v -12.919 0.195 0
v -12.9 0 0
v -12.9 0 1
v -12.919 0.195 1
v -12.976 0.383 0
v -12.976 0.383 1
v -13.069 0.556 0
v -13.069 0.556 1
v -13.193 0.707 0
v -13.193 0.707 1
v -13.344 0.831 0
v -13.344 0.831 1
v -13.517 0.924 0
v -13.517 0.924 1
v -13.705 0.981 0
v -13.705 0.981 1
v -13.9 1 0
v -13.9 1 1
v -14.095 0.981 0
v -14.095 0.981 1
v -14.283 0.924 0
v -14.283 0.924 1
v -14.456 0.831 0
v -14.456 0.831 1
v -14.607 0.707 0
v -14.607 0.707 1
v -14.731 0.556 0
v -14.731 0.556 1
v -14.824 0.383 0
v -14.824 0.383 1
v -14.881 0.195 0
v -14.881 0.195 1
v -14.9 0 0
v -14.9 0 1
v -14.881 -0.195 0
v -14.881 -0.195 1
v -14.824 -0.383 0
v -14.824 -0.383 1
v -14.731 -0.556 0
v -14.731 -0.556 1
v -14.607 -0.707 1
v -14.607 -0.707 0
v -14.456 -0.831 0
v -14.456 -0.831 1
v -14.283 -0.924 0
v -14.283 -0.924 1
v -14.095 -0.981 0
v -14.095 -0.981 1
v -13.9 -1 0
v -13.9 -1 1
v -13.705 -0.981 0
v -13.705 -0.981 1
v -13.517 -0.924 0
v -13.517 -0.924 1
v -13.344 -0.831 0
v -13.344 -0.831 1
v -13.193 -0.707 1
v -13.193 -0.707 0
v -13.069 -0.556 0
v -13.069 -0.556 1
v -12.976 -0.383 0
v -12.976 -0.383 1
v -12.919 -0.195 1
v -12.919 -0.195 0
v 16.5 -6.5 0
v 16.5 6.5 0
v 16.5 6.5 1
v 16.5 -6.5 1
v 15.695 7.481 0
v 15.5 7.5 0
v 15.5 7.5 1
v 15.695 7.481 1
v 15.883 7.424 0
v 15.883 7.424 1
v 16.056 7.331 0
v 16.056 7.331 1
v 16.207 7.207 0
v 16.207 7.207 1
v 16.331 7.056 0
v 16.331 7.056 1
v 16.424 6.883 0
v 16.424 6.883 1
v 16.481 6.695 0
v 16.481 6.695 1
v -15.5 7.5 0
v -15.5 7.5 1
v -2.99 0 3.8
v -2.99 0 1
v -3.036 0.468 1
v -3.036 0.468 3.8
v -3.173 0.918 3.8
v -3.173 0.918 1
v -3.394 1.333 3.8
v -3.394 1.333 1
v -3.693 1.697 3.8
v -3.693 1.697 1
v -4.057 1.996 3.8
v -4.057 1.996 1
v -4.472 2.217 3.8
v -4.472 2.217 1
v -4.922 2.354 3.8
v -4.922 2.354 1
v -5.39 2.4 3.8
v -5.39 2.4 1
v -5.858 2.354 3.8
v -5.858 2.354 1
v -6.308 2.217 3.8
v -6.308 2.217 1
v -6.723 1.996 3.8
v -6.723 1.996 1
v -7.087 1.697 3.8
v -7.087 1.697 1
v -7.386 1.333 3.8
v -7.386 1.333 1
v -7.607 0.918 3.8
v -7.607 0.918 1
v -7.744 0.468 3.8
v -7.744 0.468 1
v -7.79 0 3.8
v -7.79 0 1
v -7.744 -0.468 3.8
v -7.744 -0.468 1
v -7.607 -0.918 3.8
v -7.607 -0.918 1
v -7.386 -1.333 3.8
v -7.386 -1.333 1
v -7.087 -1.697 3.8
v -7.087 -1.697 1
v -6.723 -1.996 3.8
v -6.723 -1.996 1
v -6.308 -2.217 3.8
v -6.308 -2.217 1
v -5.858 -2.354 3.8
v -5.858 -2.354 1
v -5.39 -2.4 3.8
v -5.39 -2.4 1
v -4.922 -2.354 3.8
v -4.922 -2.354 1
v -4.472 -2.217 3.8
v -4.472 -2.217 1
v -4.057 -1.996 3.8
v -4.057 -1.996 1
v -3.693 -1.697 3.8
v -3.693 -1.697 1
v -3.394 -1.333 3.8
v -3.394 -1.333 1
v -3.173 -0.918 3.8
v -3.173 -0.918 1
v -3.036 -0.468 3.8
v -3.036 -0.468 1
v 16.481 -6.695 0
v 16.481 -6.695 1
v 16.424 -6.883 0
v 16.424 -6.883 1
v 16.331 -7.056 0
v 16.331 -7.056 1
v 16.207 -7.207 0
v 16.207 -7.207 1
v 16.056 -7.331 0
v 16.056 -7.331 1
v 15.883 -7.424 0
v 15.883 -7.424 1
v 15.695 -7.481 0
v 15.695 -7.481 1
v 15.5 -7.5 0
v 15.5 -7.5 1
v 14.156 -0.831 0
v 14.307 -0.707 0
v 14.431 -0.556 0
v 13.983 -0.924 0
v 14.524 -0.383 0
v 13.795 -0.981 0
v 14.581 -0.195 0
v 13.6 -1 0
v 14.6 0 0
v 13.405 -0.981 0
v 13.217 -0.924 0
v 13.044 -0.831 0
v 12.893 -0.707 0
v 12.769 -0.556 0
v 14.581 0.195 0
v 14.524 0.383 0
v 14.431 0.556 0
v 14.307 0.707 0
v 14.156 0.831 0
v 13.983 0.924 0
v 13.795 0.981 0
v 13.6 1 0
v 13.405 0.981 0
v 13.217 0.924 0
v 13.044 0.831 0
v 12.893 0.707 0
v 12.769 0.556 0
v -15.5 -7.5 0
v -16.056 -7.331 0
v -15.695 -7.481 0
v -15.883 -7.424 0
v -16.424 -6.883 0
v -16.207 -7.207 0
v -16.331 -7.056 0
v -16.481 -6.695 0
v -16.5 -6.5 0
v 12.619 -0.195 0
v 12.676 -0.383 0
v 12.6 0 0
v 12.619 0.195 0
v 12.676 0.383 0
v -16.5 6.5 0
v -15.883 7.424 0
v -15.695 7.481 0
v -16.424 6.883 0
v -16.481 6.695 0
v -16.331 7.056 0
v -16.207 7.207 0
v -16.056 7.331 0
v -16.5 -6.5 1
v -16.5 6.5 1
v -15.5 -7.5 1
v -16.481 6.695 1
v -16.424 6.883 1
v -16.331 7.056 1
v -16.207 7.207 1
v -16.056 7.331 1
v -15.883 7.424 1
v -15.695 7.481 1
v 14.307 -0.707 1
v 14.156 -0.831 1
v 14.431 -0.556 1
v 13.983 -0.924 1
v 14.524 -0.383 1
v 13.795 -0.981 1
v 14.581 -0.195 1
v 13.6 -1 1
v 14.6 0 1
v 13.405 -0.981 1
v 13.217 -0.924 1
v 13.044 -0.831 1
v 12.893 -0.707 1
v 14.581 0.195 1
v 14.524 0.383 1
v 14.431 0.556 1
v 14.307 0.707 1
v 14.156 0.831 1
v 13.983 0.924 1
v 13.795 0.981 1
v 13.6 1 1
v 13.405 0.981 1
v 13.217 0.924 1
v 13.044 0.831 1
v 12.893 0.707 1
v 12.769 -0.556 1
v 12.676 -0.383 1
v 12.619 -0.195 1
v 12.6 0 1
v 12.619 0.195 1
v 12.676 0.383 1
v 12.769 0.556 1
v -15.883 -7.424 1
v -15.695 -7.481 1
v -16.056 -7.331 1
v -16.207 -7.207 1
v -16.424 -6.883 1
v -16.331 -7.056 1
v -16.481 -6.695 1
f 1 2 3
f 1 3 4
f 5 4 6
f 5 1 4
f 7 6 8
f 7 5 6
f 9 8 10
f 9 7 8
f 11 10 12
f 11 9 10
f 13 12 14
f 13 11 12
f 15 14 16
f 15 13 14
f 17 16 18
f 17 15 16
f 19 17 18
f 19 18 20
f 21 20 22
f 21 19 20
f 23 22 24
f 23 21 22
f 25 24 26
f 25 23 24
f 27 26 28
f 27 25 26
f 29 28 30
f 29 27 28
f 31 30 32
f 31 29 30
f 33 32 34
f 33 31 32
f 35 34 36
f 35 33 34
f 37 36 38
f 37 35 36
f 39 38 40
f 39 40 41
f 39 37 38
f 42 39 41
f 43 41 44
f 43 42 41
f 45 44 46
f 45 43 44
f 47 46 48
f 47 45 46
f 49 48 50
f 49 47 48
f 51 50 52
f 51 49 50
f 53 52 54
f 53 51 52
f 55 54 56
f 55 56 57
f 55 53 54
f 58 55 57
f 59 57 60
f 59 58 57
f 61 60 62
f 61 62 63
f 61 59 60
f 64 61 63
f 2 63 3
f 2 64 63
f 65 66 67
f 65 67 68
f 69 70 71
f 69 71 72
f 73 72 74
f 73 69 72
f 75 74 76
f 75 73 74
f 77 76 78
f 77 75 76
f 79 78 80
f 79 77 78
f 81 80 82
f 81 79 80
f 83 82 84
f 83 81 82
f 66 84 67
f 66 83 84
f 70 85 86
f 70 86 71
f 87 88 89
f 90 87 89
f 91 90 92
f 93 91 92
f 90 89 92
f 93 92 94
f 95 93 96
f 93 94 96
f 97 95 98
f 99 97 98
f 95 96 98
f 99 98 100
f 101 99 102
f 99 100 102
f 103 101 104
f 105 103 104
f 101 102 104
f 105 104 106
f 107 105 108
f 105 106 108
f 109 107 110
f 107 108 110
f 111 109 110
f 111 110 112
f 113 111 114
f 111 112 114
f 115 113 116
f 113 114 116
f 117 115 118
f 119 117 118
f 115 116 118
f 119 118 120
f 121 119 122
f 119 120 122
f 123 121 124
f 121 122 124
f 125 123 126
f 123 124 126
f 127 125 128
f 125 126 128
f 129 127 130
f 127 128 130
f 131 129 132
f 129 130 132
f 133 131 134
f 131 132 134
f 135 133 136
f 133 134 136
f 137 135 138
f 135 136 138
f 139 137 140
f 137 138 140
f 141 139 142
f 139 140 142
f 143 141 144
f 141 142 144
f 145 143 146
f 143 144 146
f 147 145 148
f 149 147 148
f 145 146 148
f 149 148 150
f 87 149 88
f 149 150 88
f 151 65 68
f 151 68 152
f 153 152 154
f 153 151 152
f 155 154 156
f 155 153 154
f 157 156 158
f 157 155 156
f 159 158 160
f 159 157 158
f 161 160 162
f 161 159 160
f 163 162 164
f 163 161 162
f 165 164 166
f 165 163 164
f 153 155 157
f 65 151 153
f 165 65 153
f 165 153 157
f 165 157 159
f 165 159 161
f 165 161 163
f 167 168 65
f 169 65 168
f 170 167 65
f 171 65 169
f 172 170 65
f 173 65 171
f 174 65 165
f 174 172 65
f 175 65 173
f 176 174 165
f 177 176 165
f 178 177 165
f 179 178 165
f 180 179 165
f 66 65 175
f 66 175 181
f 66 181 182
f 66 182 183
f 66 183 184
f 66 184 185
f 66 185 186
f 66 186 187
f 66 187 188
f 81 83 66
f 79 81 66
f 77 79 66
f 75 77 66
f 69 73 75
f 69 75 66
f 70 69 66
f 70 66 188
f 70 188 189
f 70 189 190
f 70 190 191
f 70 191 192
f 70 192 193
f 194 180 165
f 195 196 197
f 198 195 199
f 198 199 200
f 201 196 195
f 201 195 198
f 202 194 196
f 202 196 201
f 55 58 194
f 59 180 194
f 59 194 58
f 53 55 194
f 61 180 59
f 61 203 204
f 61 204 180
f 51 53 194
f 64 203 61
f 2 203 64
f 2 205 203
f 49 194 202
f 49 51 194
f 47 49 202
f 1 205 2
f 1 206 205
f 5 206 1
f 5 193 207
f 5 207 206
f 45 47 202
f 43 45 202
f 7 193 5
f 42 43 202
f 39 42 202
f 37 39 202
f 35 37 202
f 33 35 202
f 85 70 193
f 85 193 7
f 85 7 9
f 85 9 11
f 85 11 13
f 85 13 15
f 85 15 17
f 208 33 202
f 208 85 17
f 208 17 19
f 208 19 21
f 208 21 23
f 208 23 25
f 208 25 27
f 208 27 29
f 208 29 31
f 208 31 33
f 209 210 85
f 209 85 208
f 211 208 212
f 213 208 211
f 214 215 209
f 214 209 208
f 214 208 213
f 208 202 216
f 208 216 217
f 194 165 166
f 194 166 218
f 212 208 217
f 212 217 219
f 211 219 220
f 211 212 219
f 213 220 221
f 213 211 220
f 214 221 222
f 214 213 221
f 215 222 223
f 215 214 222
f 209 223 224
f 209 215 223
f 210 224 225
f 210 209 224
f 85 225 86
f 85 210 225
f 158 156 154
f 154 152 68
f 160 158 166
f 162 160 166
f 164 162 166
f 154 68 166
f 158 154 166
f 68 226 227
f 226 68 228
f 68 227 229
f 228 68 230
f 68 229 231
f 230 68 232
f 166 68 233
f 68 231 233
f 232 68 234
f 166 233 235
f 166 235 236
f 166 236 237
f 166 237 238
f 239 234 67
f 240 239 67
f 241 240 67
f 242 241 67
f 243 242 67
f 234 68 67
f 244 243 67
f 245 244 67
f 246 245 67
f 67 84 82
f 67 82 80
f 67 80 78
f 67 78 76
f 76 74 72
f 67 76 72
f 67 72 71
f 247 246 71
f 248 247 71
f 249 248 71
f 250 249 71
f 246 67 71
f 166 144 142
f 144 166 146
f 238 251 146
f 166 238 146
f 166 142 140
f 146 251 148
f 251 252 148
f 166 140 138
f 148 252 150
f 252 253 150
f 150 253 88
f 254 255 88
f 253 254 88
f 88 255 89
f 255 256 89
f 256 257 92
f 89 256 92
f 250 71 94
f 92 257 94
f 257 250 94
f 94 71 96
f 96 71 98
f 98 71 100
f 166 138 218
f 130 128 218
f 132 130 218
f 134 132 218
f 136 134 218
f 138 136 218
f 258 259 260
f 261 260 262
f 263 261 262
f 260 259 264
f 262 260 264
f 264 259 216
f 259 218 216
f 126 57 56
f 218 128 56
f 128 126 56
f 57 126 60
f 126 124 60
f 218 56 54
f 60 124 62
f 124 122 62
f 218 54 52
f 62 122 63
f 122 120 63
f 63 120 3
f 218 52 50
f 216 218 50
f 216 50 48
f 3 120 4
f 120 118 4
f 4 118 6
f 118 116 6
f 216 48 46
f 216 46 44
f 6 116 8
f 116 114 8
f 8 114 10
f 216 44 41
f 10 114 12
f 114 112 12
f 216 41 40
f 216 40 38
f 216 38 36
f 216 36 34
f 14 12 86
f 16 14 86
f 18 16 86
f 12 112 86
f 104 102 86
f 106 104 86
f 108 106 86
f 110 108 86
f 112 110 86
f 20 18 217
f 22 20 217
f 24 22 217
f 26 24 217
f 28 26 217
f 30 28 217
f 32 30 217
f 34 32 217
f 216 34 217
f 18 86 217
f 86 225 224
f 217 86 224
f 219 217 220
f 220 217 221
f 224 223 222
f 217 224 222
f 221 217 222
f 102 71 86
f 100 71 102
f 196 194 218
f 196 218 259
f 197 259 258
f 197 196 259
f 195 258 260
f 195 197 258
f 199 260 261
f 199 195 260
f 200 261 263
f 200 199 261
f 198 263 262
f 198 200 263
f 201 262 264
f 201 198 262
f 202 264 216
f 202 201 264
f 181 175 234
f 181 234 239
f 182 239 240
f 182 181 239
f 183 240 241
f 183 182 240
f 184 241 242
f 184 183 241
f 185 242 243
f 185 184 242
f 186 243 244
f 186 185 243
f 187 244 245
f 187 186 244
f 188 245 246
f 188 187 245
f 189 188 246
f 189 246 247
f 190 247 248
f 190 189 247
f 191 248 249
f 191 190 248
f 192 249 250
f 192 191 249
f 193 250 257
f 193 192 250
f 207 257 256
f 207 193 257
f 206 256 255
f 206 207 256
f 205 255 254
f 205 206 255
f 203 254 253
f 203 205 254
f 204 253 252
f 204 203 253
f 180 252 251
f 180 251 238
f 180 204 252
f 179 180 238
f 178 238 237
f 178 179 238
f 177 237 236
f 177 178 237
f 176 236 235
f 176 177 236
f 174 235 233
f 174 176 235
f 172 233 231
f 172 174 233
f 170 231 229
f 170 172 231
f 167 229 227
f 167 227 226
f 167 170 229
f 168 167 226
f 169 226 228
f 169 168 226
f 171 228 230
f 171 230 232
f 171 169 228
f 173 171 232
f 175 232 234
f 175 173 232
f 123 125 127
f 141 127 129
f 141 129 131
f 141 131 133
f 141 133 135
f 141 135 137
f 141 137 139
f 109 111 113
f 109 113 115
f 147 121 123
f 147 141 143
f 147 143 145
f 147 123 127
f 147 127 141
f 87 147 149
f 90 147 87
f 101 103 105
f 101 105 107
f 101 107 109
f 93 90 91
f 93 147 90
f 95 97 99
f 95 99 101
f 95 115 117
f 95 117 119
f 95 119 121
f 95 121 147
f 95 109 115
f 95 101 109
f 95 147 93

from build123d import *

# Parameters (mm, degrees)
SKETCH1_R           = 1
BOSS_EXTRUDE1_DEPTH = 1
SKETCH2_R           = 2.4
BOSS_EXTRUDE2_DEPTH = 2.8


with BuildPart() as part:
    # Sketch1 → Boss-Extrude1 (new body)
    with BuildSketch(Plane.XY):
        with BuildLine():
            Line((-15.5, 7.5), (15.5, 7.5))
            ThreePointArc((15.5, 7.5), (16.207106781, 7.207106781), (16.5, 6.5))
            Line((16.5, 6.5), (16.5, -6.5))
            ThreePointArc((16.5, -6.5), (16.207106781, -7.207106781), (15.5, -7.5))
            Line((15.5, -7.5), (-15.5, -7.5))
            ThreePointArc((-15.5, -7.5), (-16.207106781, -7.207106781), (-16.5, -6.5))
            Line((-16.5, -6.5), (-16.5, 6.5))
            ThreePointArc((-16.5, 6.5), (-16.207106781, 7.207106781), (-15.5, 7.5))
        make_face()
        with Locations((-13.9, 0)):
            Circle(SKETCH1_R, mode=Mode.SUBTRACT)
        with Locations((13.6, 0)):
            Circle(SKETCH1_R, mode=Mode.SUBTRACT)
    extrude(amount=BOSS_EXTRUDE1_DEPTH)

    # Sketch2 → Boss-Extrude2 (add)
    with BuildSketch(Plane.XY.offset(1)):
        with Locations((-5.39, 0)):
            Circle(SKETCH2_R)
    extrude(amount=BOSS_EXTRUDE2_DEPTH)


solid = part.part
